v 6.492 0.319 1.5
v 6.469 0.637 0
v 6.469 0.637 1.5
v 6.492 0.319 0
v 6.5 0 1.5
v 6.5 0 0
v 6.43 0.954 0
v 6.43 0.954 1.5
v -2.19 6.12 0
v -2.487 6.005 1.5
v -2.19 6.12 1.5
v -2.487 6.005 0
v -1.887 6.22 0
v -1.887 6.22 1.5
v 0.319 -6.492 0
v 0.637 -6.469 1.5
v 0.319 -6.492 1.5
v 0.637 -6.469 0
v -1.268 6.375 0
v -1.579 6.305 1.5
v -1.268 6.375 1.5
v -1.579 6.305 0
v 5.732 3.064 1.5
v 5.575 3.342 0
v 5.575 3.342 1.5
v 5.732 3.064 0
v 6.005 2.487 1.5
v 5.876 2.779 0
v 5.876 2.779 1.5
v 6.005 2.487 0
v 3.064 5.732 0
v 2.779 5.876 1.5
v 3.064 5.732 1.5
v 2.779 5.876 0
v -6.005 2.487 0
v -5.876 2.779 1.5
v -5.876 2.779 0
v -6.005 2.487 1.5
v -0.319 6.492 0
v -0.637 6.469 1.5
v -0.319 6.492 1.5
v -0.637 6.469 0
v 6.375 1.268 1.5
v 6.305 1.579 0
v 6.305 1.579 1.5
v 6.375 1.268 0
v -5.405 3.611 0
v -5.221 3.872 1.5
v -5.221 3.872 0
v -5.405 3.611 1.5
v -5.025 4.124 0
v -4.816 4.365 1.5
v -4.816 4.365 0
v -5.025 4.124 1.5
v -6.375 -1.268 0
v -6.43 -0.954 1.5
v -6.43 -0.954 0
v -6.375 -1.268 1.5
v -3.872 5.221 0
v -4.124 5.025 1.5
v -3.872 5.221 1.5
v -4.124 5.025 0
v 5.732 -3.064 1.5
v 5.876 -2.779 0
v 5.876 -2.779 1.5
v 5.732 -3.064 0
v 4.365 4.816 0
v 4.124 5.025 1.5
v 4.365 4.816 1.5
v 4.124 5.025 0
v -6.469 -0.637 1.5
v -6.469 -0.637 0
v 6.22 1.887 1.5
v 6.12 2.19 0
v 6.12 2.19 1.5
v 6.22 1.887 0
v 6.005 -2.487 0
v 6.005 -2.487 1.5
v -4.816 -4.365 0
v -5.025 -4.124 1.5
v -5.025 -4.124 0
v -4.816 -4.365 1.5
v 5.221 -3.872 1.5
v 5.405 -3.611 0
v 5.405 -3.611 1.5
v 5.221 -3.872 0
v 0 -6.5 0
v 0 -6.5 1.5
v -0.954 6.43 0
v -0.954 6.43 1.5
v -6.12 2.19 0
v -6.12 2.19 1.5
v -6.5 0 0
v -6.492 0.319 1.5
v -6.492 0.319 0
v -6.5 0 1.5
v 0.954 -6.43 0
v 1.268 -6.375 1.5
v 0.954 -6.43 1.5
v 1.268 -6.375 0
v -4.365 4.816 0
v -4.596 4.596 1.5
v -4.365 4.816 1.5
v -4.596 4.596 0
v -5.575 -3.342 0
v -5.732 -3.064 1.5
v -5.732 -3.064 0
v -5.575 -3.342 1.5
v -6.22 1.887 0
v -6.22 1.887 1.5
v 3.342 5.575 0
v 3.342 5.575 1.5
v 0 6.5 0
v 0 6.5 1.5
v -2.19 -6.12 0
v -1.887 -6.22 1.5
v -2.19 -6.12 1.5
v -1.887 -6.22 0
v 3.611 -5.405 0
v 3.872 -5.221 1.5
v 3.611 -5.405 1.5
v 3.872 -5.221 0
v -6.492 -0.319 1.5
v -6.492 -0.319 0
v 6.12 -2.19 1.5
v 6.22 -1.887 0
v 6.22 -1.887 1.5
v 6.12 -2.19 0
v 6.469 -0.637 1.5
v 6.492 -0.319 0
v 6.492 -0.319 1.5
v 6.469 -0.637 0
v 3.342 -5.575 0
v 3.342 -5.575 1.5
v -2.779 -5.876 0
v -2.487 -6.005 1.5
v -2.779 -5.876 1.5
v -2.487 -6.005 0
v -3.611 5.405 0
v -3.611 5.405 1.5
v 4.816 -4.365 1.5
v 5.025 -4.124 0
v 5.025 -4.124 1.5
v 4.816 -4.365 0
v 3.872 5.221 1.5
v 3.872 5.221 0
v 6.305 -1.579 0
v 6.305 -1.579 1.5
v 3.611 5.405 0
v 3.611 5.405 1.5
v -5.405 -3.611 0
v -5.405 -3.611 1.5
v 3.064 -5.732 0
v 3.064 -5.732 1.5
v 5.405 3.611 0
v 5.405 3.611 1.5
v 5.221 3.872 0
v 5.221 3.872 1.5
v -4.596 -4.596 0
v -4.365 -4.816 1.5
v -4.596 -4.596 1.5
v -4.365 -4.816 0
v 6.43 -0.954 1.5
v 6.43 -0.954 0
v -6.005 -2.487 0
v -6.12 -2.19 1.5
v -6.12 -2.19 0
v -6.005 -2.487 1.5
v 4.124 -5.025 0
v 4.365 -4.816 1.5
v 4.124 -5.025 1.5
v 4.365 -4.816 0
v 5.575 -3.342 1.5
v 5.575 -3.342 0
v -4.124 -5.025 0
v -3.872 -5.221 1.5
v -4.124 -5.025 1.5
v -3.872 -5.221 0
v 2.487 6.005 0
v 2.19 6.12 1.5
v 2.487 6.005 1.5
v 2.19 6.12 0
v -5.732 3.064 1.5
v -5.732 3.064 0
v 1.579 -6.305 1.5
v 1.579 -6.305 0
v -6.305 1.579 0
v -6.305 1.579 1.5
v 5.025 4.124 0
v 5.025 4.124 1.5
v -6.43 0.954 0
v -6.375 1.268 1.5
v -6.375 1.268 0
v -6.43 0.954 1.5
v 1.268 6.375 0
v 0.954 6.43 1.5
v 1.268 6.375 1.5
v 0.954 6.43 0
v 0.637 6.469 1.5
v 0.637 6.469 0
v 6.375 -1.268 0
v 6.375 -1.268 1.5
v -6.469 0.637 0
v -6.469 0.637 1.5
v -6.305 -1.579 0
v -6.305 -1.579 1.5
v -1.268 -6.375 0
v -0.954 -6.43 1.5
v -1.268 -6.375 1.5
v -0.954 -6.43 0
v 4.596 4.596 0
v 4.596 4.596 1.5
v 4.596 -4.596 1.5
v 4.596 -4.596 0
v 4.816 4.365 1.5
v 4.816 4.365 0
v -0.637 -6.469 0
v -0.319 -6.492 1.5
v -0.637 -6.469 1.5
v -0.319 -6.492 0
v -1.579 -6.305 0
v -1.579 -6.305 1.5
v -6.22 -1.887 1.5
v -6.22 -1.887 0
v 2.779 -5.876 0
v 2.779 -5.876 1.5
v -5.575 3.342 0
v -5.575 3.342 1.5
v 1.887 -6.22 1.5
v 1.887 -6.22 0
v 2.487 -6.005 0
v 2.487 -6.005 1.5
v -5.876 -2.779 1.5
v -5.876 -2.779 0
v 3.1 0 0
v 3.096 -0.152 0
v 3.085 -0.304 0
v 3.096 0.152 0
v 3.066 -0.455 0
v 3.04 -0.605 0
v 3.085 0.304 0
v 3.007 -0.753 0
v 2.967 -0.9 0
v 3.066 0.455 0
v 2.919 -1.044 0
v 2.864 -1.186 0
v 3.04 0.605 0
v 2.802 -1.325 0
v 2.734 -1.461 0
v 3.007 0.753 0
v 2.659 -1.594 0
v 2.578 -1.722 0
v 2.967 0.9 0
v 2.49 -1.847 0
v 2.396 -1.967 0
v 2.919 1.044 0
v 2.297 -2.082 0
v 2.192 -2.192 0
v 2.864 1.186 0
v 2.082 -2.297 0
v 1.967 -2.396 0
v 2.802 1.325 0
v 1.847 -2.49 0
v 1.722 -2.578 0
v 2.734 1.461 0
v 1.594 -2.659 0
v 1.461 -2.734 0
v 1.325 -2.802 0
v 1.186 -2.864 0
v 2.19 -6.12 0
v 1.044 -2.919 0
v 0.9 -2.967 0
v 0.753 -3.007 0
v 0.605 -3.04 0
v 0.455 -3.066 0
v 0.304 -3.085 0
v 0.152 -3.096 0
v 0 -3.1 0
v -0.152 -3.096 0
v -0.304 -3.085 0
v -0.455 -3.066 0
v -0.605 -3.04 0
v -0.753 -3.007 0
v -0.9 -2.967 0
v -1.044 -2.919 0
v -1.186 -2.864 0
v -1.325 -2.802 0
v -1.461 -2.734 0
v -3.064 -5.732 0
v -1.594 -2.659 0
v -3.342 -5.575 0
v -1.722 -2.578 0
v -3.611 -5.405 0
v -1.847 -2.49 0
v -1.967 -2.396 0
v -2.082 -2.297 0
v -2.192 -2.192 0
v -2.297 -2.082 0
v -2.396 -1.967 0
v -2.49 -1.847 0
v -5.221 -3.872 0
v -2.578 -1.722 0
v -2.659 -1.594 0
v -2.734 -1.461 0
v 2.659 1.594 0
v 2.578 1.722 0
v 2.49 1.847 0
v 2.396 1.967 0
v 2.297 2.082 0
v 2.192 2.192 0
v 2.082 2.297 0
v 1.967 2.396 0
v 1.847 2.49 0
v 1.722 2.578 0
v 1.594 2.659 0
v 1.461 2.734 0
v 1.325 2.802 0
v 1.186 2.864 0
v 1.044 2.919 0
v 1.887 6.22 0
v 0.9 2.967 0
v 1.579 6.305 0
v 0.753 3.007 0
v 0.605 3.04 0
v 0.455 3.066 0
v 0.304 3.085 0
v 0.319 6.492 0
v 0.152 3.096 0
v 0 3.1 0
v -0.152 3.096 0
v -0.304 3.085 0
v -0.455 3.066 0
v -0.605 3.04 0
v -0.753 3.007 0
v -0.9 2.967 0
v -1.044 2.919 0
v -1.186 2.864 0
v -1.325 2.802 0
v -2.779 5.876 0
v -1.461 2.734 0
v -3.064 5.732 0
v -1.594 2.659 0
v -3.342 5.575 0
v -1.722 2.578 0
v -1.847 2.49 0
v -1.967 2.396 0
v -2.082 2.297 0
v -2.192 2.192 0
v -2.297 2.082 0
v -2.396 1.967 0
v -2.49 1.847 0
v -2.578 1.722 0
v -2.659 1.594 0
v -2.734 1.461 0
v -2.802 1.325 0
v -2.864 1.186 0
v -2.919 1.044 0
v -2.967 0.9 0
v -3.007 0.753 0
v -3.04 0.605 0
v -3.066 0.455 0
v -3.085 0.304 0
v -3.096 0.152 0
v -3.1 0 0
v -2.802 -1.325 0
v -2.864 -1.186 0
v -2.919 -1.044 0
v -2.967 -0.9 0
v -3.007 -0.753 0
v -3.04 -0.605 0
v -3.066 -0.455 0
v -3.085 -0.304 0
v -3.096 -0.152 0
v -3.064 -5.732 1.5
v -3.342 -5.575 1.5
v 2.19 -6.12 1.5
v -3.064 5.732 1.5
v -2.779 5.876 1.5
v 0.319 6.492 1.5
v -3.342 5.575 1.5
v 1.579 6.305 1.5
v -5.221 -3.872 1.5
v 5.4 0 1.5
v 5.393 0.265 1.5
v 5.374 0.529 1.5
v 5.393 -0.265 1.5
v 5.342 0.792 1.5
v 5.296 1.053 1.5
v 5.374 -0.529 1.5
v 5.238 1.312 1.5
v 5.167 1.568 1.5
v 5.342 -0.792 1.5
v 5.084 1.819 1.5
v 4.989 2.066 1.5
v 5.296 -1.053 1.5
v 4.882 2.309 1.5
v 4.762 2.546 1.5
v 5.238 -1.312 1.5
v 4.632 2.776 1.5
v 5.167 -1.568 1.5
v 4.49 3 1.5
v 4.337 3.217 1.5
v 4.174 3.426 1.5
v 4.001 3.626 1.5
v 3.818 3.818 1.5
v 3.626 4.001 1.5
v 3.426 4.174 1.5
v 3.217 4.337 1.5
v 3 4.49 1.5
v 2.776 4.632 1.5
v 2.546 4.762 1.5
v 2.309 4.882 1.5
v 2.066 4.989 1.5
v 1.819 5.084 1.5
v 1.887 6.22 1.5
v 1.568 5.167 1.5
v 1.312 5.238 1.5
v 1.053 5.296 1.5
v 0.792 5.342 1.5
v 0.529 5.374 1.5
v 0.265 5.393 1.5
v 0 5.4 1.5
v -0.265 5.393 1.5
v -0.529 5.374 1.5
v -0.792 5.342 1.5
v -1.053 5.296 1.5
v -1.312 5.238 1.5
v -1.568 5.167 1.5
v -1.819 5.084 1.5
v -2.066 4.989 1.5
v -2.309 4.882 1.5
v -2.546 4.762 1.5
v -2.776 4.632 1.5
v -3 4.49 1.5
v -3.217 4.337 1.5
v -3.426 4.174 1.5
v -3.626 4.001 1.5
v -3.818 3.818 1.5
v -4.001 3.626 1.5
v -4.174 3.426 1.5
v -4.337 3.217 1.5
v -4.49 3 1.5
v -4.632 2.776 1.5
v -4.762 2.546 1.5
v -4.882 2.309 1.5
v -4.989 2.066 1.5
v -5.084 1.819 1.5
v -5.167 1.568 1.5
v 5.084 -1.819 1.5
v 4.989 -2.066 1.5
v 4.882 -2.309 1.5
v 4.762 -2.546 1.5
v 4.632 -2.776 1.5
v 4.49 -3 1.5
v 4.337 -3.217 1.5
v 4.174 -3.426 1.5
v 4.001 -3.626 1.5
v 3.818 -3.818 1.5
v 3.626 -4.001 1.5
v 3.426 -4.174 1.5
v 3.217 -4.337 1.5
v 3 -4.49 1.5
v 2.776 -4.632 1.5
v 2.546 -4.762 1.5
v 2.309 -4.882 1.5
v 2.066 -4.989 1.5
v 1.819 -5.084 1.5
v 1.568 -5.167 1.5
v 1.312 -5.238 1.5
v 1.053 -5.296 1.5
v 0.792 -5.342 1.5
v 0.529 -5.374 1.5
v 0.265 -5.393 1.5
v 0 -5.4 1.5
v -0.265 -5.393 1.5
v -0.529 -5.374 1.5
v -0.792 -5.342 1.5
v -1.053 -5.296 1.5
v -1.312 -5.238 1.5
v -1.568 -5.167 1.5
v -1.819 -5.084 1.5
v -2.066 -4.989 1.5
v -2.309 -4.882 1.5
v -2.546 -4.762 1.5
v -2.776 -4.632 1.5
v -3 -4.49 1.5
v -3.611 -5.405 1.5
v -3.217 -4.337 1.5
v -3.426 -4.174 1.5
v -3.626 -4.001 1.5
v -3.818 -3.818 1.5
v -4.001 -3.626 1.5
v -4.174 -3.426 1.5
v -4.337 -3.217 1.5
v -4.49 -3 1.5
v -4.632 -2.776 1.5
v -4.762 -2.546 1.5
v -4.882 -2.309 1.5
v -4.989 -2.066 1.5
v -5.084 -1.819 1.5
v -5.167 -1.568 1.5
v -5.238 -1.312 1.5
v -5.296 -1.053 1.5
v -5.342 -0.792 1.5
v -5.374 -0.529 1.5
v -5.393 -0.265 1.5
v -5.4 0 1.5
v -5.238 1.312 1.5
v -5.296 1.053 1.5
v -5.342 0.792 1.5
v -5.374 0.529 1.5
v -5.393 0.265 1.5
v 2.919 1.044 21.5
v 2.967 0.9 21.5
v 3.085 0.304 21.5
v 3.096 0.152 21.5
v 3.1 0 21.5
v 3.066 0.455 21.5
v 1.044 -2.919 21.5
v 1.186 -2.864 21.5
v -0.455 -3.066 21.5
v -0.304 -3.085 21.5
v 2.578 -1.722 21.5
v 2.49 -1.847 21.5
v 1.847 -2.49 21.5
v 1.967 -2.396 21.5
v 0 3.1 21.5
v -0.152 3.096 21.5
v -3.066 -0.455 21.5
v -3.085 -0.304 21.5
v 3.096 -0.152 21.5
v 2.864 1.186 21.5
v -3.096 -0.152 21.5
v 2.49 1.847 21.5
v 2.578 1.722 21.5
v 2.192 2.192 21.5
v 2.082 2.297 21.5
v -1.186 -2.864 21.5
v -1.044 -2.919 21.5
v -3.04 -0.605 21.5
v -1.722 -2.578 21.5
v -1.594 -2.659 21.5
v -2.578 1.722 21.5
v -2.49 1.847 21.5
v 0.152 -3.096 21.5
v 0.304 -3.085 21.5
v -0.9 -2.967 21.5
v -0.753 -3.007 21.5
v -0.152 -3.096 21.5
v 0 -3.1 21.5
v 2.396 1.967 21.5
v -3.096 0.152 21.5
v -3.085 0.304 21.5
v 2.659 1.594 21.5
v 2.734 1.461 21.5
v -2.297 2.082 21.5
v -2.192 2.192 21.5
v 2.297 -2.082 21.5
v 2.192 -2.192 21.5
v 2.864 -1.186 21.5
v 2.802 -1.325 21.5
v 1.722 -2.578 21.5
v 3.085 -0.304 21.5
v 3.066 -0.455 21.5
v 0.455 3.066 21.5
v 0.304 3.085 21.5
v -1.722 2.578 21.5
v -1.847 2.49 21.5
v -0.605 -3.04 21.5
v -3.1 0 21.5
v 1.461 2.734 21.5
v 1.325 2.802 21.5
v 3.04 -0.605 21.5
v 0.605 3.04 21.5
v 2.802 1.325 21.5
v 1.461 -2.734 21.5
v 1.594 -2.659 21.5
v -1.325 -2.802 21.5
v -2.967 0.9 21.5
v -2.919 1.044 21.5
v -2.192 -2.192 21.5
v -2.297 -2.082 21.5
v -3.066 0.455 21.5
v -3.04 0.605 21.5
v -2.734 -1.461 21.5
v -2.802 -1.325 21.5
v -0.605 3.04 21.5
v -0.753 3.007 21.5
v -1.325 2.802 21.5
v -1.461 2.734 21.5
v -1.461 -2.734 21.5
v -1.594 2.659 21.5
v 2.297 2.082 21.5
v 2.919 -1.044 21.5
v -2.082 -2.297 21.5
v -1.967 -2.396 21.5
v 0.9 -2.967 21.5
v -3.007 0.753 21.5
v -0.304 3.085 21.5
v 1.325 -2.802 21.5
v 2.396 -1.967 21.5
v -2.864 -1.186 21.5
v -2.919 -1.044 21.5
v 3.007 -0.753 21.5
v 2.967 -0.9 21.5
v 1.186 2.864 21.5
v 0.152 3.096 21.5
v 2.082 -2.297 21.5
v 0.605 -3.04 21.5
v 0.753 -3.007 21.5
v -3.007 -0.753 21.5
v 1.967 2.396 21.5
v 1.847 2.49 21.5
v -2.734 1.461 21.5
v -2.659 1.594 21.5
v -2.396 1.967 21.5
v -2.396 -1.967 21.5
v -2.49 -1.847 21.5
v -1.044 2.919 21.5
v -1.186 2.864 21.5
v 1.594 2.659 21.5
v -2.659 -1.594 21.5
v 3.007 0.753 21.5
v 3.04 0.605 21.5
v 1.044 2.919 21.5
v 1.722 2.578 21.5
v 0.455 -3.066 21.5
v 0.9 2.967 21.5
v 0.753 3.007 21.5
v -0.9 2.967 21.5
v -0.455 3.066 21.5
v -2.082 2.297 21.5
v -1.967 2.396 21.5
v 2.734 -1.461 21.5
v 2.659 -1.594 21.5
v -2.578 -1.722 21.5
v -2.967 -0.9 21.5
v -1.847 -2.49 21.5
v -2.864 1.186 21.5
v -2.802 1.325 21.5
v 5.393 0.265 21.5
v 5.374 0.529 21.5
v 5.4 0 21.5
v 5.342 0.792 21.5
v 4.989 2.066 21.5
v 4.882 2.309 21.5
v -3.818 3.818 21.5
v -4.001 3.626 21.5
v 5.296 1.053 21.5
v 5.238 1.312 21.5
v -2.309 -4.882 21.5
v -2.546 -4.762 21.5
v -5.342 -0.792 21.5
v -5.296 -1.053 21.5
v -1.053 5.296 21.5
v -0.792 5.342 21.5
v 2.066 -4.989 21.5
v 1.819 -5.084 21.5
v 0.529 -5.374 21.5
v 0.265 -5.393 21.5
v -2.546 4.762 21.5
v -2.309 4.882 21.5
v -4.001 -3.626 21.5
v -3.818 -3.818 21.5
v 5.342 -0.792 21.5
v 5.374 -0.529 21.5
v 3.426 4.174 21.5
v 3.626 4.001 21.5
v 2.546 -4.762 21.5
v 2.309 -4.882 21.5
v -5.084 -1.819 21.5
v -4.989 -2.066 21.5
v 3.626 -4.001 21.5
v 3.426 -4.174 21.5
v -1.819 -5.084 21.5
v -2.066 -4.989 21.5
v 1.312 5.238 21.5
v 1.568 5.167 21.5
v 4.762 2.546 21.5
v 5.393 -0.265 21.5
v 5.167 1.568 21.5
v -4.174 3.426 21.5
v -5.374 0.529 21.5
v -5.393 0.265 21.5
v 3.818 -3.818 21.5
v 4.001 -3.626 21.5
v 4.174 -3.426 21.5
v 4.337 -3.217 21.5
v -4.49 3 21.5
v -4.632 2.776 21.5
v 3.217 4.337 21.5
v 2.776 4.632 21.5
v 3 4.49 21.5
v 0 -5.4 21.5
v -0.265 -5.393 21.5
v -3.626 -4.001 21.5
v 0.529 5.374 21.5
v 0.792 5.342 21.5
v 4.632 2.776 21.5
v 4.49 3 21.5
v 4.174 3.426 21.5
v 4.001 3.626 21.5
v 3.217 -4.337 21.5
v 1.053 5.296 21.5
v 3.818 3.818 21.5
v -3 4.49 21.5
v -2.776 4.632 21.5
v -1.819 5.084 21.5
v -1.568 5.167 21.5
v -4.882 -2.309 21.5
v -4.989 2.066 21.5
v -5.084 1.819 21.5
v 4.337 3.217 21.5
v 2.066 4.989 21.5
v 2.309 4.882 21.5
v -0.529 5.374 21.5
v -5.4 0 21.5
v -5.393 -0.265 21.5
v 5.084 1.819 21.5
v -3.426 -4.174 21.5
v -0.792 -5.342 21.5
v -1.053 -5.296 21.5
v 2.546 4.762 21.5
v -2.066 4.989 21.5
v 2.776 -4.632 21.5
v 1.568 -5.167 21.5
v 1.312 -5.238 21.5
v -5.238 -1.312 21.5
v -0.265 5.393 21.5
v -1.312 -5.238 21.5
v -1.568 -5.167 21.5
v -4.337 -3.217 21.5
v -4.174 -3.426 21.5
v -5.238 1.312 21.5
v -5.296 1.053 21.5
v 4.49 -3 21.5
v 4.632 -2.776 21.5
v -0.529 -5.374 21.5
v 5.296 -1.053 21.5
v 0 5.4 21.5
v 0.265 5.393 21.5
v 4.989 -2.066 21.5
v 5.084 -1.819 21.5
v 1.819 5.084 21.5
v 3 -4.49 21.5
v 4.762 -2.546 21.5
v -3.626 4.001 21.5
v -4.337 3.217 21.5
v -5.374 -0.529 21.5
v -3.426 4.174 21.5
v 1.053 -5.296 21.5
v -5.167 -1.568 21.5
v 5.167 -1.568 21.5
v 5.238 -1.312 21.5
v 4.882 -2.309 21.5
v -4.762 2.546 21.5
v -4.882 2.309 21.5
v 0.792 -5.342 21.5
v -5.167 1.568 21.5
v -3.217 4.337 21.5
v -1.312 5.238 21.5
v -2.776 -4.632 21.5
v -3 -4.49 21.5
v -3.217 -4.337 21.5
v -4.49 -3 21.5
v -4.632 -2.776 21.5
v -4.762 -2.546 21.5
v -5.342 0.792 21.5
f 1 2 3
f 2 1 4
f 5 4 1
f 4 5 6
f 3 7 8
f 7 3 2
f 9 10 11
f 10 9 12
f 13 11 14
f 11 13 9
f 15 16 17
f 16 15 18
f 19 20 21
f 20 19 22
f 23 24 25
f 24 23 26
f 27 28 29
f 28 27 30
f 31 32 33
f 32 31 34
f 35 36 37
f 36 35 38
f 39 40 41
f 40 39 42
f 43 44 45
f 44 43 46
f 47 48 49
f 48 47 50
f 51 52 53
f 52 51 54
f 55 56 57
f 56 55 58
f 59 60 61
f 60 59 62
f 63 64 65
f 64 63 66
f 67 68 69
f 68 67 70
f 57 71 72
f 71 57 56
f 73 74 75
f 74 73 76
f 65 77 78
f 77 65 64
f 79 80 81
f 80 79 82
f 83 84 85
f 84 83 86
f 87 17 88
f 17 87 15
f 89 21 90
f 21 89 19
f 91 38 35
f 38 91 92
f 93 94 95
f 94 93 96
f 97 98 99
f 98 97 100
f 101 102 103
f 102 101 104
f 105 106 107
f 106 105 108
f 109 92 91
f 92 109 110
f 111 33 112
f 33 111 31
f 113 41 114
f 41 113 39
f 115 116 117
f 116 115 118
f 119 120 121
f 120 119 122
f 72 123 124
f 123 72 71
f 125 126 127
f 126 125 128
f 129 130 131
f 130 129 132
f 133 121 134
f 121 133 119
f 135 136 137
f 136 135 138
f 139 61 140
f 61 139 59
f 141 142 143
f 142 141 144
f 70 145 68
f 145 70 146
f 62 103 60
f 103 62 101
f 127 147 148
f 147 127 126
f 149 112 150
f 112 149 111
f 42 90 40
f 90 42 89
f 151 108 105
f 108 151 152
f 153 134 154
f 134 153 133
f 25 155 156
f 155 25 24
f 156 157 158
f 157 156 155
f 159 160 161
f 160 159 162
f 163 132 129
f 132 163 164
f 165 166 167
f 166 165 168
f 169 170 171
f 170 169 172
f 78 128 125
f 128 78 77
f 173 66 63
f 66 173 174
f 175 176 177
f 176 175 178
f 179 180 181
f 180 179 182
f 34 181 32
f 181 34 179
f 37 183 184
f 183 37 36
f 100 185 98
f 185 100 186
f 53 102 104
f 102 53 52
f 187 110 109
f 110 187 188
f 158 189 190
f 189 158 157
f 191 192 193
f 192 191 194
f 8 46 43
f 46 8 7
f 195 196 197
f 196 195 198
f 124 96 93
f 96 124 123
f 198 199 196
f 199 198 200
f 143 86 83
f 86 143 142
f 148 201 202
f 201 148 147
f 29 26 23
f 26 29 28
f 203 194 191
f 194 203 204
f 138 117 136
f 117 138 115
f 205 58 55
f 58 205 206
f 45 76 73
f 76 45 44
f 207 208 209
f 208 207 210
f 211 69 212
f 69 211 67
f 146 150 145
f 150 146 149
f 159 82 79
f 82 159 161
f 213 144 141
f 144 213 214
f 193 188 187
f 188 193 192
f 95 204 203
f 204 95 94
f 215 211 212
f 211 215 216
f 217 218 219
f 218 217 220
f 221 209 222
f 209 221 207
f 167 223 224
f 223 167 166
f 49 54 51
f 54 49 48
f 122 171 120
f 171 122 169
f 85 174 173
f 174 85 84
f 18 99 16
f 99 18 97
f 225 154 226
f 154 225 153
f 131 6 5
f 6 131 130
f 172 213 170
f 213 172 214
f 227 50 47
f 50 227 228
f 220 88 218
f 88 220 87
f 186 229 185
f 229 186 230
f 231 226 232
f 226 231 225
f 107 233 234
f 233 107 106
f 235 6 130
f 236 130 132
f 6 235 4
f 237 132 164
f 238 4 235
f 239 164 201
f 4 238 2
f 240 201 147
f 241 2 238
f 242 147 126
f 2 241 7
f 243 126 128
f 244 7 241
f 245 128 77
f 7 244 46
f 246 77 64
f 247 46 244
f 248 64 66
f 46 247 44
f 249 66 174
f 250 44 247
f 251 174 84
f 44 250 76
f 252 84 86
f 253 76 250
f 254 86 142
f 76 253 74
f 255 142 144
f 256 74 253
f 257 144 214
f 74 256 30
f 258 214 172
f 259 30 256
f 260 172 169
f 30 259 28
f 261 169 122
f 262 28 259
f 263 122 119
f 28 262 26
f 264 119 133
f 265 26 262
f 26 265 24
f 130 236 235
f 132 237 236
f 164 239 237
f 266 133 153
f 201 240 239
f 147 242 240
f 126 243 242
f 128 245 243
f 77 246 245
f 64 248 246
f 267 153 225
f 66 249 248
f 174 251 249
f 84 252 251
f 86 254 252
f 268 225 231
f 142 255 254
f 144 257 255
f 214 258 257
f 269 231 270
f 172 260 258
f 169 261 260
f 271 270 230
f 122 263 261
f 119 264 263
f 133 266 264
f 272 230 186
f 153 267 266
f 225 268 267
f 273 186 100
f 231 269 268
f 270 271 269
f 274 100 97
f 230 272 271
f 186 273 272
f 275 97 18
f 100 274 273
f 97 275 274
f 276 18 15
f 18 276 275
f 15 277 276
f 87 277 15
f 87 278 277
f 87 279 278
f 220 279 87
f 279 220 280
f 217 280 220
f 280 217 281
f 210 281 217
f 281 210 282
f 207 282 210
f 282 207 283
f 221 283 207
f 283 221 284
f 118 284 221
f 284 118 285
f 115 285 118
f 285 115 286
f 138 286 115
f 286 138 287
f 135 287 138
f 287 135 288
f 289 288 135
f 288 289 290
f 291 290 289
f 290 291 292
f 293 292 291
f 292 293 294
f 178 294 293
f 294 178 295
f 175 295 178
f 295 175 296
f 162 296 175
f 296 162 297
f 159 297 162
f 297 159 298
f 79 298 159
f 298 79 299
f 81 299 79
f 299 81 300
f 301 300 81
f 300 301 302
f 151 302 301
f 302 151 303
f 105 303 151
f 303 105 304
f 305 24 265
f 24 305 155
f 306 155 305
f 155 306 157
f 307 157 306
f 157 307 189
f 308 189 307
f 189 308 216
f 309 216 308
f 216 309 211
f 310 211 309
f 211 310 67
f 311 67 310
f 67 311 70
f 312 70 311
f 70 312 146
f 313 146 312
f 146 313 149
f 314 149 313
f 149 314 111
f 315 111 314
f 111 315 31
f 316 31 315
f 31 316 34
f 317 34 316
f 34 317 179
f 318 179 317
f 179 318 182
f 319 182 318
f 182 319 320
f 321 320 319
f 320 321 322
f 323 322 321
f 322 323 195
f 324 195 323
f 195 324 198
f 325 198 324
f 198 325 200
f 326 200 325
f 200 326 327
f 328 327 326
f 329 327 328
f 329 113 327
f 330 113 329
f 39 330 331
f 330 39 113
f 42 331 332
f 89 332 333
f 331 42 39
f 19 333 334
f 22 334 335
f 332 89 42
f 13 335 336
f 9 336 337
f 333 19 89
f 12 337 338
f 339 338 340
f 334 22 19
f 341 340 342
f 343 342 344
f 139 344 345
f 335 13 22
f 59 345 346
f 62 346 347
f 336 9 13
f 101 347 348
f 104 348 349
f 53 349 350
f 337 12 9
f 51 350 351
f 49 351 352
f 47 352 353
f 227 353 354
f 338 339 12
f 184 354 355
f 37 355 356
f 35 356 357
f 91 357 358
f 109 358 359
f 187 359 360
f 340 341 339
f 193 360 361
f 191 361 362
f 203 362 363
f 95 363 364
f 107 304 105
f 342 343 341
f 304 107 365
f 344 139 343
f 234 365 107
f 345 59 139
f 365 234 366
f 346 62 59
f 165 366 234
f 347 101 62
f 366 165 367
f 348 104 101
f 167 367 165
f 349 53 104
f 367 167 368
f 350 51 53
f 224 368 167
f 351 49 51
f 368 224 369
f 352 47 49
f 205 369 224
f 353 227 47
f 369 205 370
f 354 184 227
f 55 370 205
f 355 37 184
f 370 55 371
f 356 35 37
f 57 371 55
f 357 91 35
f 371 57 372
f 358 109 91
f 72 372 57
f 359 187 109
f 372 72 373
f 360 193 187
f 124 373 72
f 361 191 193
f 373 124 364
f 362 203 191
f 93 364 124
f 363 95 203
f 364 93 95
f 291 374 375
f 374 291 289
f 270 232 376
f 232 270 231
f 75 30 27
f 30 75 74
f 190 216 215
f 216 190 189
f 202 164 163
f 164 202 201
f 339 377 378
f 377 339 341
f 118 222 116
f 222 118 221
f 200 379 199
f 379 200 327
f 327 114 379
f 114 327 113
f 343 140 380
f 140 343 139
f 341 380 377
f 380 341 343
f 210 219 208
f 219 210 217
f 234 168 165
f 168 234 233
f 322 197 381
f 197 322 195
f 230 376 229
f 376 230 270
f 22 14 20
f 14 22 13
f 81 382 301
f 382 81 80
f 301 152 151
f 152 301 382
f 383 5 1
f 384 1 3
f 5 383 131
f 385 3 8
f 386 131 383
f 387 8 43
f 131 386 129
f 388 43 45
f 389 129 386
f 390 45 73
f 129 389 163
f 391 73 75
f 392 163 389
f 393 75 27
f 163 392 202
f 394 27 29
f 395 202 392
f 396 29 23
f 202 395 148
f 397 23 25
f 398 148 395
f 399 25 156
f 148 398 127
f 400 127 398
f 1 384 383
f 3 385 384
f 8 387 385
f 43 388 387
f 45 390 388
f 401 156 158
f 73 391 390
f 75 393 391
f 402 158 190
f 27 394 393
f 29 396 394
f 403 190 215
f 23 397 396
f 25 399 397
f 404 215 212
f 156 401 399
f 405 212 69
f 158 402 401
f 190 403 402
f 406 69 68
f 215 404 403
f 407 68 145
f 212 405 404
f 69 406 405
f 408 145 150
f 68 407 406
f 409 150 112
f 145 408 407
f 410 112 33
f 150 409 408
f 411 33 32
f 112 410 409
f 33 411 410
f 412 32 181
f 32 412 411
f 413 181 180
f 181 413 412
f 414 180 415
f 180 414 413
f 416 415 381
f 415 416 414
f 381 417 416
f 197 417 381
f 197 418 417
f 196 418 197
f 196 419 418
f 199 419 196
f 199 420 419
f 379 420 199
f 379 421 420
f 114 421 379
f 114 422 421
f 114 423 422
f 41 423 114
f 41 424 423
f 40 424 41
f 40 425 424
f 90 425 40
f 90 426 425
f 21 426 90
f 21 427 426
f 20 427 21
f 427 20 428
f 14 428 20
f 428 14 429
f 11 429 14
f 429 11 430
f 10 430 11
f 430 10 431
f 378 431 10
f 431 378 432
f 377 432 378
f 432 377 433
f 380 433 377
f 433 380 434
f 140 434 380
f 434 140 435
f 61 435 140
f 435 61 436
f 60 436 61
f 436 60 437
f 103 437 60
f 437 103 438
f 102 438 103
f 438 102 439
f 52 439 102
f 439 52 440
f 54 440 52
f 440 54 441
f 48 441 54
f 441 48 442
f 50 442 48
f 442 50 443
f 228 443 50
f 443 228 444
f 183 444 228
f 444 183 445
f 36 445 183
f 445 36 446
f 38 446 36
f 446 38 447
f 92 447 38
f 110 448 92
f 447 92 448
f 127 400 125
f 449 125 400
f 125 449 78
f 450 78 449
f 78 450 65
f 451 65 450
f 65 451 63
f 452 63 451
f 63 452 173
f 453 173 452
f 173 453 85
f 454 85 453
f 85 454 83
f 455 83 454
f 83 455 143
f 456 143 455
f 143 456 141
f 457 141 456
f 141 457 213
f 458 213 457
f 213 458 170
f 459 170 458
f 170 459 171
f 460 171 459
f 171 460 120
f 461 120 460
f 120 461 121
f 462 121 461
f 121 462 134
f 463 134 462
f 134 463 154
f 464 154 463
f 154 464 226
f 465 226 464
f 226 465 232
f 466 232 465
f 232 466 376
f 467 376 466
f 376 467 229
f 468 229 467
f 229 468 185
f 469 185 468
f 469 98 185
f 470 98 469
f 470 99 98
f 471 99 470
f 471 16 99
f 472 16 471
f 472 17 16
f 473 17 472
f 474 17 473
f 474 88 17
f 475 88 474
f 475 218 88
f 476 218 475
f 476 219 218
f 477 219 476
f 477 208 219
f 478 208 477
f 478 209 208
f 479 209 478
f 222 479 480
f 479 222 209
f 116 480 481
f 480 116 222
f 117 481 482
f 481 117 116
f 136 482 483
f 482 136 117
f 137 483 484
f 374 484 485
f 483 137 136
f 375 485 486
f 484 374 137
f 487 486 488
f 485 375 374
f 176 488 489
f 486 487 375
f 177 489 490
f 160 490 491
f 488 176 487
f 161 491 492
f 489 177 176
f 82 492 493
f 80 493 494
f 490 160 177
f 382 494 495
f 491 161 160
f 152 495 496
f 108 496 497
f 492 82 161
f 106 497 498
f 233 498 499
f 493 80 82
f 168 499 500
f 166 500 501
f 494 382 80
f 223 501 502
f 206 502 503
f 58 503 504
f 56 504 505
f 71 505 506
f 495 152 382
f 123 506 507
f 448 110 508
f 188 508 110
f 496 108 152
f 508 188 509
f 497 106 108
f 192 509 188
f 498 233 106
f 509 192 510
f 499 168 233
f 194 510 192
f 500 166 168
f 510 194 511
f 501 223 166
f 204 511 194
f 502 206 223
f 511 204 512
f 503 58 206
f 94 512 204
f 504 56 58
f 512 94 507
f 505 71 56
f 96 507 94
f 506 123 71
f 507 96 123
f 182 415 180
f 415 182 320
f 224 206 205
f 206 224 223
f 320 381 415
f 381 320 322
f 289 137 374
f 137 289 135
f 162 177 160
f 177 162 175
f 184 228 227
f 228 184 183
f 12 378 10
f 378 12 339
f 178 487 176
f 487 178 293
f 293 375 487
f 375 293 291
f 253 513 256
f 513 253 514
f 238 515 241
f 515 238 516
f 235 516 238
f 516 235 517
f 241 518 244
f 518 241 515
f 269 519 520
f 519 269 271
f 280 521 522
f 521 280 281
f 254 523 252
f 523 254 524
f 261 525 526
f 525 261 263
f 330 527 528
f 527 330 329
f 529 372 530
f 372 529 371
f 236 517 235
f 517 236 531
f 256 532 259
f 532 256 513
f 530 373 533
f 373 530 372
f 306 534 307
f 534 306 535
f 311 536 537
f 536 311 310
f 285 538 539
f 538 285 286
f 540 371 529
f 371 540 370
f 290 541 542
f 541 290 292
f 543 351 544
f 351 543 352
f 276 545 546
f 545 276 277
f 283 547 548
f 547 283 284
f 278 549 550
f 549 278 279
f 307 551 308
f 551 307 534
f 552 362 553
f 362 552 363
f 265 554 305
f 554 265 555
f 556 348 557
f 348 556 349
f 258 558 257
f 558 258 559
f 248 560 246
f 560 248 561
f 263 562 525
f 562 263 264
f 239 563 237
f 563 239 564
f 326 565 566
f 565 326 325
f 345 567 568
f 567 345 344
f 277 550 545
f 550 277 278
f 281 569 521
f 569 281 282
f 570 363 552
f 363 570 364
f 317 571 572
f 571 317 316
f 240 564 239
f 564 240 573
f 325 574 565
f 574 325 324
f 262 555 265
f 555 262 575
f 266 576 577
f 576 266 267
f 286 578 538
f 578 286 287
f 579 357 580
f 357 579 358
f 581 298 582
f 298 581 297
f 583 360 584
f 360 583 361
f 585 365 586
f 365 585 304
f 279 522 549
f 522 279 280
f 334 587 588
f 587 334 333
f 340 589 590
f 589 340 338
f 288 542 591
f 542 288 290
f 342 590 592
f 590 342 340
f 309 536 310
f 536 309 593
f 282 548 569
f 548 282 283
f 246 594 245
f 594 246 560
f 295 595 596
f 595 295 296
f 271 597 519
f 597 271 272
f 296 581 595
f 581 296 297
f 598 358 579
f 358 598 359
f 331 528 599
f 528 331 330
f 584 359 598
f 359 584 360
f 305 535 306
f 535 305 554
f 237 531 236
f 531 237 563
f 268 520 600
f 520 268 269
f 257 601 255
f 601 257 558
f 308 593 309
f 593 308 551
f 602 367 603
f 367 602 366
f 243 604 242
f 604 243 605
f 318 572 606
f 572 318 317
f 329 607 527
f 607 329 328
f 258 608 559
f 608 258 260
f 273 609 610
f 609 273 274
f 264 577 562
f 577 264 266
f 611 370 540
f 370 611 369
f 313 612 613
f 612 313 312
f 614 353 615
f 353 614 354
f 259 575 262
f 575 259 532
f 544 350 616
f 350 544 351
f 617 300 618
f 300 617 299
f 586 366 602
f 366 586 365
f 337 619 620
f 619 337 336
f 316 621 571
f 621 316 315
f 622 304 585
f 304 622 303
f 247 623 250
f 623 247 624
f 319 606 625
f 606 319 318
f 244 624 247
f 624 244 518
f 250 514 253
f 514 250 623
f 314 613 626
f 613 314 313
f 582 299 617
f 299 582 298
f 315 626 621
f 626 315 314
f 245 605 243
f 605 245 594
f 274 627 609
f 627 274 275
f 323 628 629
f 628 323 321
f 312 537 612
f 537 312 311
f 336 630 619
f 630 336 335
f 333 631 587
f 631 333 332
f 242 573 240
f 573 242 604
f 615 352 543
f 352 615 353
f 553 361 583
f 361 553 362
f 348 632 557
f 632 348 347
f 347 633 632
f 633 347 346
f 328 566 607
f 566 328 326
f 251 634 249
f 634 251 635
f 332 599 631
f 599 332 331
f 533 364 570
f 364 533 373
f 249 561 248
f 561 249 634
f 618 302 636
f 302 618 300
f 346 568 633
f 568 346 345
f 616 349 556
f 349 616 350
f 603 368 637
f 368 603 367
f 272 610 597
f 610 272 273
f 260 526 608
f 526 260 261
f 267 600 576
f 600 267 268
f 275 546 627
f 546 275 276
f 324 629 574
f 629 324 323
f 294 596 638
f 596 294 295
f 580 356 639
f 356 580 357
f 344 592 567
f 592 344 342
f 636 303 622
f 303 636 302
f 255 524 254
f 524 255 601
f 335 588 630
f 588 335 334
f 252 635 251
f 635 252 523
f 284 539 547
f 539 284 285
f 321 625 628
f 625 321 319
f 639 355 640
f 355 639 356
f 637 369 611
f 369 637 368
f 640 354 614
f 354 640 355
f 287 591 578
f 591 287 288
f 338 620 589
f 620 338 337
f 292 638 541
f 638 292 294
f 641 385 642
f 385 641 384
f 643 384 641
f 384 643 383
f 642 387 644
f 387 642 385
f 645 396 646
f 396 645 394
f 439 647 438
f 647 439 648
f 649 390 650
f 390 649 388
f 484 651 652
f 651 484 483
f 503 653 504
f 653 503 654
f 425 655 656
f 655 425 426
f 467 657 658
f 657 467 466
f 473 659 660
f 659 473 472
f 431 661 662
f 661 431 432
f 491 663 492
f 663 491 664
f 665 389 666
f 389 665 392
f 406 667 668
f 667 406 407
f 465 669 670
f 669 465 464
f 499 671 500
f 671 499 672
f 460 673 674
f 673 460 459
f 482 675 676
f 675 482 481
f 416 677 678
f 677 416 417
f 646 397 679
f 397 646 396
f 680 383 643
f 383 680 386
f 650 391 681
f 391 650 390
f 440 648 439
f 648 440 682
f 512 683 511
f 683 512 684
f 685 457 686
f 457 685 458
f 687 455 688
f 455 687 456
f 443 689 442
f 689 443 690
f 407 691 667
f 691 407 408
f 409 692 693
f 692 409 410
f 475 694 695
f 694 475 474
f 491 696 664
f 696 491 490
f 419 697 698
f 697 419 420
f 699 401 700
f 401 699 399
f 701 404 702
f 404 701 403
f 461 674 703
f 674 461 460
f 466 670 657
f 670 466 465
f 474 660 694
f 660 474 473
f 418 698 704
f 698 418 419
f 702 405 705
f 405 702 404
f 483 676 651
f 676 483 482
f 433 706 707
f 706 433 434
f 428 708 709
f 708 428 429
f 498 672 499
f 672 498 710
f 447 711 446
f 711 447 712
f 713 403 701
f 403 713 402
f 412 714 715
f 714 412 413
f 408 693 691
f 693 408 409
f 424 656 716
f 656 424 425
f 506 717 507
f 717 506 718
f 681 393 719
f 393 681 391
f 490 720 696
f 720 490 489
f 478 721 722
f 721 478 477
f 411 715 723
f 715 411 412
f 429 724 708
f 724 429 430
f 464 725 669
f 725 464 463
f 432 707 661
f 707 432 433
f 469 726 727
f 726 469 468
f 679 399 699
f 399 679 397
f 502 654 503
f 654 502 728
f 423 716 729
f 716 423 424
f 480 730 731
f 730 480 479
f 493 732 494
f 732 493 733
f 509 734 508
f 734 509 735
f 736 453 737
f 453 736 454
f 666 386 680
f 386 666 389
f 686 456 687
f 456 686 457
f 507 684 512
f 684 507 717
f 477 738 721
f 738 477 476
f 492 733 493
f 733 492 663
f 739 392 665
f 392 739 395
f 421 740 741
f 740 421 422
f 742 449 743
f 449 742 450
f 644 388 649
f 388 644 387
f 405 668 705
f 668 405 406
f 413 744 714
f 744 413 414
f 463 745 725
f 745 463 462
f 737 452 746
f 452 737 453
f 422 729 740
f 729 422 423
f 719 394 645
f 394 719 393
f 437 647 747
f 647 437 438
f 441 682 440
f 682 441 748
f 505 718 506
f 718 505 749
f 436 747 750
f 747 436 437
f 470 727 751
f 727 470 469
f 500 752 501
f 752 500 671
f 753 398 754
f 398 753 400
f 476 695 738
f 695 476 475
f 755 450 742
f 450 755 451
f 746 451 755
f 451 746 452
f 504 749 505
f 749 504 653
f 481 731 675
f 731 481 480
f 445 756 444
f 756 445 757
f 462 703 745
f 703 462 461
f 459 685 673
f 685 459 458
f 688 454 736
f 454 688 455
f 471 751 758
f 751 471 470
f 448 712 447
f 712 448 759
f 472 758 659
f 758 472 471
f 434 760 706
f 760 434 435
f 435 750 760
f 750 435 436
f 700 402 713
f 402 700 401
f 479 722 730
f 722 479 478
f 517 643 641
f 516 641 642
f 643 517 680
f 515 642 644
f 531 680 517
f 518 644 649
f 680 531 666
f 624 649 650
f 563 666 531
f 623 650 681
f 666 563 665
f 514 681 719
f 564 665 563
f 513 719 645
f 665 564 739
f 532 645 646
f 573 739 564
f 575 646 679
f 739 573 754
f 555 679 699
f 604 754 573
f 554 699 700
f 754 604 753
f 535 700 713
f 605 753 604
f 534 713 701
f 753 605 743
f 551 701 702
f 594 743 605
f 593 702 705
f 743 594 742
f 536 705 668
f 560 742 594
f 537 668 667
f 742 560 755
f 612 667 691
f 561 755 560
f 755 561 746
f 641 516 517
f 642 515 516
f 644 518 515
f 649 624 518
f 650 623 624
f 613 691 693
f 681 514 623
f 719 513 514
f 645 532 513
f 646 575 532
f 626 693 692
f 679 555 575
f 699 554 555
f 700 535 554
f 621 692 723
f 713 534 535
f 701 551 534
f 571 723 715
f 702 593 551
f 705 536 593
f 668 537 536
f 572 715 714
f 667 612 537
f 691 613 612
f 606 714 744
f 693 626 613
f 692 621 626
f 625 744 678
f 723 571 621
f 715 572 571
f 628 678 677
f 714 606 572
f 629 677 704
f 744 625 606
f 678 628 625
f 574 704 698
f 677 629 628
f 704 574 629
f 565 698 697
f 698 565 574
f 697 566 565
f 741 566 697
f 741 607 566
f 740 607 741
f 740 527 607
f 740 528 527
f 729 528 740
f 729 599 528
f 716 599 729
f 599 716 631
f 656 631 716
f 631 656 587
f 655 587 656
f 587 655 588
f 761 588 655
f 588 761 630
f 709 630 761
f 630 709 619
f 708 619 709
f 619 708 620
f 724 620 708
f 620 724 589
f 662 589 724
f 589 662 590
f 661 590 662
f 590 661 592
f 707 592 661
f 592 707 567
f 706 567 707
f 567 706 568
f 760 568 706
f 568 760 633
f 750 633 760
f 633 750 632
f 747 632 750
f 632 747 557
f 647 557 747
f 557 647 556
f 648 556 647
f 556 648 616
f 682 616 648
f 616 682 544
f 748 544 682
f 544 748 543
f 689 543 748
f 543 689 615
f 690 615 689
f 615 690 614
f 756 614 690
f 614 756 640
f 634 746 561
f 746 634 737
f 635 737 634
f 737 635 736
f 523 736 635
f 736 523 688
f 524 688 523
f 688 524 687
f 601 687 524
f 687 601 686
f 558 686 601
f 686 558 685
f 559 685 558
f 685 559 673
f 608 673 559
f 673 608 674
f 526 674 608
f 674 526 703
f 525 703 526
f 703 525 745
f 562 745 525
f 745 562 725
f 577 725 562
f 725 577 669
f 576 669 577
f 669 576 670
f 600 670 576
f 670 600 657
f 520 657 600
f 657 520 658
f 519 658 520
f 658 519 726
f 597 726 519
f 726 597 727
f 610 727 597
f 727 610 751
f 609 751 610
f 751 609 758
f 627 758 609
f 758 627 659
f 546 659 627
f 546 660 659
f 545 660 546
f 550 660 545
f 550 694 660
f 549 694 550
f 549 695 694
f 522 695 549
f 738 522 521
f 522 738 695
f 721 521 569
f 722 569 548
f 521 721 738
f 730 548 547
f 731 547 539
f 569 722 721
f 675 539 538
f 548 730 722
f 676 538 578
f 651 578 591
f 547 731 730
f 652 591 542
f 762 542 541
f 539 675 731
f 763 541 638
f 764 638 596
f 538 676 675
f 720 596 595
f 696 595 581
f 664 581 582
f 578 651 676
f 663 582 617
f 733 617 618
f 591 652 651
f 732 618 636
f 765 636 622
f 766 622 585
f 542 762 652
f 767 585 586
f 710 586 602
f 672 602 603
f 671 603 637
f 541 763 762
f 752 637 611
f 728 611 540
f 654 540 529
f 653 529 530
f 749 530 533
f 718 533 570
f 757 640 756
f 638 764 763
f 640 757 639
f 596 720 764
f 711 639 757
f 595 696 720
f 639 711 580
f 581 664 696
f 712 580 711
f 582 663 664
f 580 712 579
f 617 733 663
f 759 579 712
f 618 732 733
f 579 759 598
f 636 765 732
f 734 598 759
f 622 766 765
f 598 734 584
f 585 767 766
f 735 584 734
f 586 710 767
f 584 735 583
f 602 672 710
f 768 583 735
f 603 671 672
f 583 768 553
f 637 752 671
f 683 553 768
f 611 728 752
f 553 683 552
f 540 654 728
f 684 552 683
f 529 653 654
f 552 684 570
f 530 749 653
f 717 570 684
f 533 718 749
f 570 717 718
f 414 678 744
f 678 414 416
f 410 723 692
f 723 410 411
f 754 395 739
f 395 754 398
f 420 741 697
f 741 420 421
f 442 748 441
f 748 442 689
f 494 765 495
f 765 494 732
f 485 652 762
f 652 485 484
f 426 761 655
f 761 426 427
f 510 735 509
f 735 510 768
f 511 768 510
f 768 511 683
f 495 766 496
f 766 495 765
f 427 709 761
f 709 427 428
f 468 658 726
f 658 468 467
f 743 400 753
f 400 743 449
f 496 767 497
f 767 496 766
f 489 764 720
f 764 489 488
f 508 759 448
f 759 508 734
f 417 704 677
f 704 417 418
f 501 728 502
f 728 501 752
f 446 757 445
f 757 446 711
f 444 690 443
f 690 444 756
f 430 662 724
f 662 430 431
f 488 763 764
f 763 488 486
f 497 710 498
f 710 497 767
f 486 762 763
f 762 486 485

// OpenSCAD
// Adapter Sleeve for 0.2mL PCR tubes in 1.5mL Rack Holes
// Print Orientation: Upside down (Collar on bed)
// Units: mm

// --- Dimensions ---
$fn = 128; // High resolution for smooth curves and accurate holes

// Collar (Base)
$collar_outer_d = 13.0;
$collar_thickness = 1.5;

// Sleeve Body
$sleeve_outer_d = 10.8;
$sleeve_total_height = 21.5;
$sleeve_inner_d = 6.2;

// --- Calculated Variables ---
$collar_radius = $collar_outer_d / 2;
$sleeve_radius = $sleeve_outer_d / 2;
$sleeve_inner_radius = $sleeve_inner_d / 2;
$sleeve_body_height = $sleeve_total_height - $collar_thickness;

// --- Main Module ---
module adapter_sleeve() {
    // 1. Create the Collar (Base)
    // Lies on XY plane from z=0 to z=1.5
    difference() {
        // Outer shape of collar
        cylinder(
            h = $collar_thickness,
            r = $collar_radius,
            center = [0, 0, $collar_thickness / 2]
        );
        
        // Cut the bore through the collar
        cylinder(
            h = $collar_thickness + 2, // Extend slightly past faces
            r = $sleeve_inner_radius,
            center = [0, 0, $collar_thickness / 2]
        );
    }
    
    // 2. Create the Sleeve Body
    // Rises from z=1.5 to z=21.5
    translate([0, 0, $collar_thickness]) {
        difference() {
            // Outer shape of sleeve body
            cylinder(
                h = $sleeve_body_height,
                r = $sleeve_radius,
                center = [0, 0, $sleeve_body_height / 2]
            );
            
            // Cut the bore through the sleeve body
            cylinder(
                h = $sleeve_body_height + 2, // Extend slightly past faces
                r = $sleeve_inner_radius,
                center = [0, 0, $sleeve_body_height / 2]
            );
        }
    }
}

// --- Render ---
adapter_sleeve();
